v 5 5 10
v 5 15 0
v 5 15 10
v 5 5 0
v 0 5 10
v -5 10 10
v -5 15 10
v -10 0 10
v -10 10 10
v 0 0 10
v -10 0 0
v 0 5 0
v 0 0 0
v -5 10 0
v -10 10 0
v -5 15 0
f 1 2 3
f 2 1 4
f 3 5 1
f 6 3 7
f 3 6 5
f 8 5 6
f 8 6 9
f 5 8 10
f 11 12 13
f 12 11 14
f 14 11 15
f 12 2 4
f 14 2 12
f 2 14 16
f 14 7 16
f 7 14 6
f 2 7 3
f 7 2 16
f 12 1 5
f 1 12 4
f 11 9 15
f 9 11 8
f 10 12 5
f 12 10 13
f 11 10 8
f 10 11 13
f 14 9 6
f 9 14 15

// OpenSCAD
translate([-5,5,0]) cube(10);
rotate([0, -90, 0]) cube(10);
